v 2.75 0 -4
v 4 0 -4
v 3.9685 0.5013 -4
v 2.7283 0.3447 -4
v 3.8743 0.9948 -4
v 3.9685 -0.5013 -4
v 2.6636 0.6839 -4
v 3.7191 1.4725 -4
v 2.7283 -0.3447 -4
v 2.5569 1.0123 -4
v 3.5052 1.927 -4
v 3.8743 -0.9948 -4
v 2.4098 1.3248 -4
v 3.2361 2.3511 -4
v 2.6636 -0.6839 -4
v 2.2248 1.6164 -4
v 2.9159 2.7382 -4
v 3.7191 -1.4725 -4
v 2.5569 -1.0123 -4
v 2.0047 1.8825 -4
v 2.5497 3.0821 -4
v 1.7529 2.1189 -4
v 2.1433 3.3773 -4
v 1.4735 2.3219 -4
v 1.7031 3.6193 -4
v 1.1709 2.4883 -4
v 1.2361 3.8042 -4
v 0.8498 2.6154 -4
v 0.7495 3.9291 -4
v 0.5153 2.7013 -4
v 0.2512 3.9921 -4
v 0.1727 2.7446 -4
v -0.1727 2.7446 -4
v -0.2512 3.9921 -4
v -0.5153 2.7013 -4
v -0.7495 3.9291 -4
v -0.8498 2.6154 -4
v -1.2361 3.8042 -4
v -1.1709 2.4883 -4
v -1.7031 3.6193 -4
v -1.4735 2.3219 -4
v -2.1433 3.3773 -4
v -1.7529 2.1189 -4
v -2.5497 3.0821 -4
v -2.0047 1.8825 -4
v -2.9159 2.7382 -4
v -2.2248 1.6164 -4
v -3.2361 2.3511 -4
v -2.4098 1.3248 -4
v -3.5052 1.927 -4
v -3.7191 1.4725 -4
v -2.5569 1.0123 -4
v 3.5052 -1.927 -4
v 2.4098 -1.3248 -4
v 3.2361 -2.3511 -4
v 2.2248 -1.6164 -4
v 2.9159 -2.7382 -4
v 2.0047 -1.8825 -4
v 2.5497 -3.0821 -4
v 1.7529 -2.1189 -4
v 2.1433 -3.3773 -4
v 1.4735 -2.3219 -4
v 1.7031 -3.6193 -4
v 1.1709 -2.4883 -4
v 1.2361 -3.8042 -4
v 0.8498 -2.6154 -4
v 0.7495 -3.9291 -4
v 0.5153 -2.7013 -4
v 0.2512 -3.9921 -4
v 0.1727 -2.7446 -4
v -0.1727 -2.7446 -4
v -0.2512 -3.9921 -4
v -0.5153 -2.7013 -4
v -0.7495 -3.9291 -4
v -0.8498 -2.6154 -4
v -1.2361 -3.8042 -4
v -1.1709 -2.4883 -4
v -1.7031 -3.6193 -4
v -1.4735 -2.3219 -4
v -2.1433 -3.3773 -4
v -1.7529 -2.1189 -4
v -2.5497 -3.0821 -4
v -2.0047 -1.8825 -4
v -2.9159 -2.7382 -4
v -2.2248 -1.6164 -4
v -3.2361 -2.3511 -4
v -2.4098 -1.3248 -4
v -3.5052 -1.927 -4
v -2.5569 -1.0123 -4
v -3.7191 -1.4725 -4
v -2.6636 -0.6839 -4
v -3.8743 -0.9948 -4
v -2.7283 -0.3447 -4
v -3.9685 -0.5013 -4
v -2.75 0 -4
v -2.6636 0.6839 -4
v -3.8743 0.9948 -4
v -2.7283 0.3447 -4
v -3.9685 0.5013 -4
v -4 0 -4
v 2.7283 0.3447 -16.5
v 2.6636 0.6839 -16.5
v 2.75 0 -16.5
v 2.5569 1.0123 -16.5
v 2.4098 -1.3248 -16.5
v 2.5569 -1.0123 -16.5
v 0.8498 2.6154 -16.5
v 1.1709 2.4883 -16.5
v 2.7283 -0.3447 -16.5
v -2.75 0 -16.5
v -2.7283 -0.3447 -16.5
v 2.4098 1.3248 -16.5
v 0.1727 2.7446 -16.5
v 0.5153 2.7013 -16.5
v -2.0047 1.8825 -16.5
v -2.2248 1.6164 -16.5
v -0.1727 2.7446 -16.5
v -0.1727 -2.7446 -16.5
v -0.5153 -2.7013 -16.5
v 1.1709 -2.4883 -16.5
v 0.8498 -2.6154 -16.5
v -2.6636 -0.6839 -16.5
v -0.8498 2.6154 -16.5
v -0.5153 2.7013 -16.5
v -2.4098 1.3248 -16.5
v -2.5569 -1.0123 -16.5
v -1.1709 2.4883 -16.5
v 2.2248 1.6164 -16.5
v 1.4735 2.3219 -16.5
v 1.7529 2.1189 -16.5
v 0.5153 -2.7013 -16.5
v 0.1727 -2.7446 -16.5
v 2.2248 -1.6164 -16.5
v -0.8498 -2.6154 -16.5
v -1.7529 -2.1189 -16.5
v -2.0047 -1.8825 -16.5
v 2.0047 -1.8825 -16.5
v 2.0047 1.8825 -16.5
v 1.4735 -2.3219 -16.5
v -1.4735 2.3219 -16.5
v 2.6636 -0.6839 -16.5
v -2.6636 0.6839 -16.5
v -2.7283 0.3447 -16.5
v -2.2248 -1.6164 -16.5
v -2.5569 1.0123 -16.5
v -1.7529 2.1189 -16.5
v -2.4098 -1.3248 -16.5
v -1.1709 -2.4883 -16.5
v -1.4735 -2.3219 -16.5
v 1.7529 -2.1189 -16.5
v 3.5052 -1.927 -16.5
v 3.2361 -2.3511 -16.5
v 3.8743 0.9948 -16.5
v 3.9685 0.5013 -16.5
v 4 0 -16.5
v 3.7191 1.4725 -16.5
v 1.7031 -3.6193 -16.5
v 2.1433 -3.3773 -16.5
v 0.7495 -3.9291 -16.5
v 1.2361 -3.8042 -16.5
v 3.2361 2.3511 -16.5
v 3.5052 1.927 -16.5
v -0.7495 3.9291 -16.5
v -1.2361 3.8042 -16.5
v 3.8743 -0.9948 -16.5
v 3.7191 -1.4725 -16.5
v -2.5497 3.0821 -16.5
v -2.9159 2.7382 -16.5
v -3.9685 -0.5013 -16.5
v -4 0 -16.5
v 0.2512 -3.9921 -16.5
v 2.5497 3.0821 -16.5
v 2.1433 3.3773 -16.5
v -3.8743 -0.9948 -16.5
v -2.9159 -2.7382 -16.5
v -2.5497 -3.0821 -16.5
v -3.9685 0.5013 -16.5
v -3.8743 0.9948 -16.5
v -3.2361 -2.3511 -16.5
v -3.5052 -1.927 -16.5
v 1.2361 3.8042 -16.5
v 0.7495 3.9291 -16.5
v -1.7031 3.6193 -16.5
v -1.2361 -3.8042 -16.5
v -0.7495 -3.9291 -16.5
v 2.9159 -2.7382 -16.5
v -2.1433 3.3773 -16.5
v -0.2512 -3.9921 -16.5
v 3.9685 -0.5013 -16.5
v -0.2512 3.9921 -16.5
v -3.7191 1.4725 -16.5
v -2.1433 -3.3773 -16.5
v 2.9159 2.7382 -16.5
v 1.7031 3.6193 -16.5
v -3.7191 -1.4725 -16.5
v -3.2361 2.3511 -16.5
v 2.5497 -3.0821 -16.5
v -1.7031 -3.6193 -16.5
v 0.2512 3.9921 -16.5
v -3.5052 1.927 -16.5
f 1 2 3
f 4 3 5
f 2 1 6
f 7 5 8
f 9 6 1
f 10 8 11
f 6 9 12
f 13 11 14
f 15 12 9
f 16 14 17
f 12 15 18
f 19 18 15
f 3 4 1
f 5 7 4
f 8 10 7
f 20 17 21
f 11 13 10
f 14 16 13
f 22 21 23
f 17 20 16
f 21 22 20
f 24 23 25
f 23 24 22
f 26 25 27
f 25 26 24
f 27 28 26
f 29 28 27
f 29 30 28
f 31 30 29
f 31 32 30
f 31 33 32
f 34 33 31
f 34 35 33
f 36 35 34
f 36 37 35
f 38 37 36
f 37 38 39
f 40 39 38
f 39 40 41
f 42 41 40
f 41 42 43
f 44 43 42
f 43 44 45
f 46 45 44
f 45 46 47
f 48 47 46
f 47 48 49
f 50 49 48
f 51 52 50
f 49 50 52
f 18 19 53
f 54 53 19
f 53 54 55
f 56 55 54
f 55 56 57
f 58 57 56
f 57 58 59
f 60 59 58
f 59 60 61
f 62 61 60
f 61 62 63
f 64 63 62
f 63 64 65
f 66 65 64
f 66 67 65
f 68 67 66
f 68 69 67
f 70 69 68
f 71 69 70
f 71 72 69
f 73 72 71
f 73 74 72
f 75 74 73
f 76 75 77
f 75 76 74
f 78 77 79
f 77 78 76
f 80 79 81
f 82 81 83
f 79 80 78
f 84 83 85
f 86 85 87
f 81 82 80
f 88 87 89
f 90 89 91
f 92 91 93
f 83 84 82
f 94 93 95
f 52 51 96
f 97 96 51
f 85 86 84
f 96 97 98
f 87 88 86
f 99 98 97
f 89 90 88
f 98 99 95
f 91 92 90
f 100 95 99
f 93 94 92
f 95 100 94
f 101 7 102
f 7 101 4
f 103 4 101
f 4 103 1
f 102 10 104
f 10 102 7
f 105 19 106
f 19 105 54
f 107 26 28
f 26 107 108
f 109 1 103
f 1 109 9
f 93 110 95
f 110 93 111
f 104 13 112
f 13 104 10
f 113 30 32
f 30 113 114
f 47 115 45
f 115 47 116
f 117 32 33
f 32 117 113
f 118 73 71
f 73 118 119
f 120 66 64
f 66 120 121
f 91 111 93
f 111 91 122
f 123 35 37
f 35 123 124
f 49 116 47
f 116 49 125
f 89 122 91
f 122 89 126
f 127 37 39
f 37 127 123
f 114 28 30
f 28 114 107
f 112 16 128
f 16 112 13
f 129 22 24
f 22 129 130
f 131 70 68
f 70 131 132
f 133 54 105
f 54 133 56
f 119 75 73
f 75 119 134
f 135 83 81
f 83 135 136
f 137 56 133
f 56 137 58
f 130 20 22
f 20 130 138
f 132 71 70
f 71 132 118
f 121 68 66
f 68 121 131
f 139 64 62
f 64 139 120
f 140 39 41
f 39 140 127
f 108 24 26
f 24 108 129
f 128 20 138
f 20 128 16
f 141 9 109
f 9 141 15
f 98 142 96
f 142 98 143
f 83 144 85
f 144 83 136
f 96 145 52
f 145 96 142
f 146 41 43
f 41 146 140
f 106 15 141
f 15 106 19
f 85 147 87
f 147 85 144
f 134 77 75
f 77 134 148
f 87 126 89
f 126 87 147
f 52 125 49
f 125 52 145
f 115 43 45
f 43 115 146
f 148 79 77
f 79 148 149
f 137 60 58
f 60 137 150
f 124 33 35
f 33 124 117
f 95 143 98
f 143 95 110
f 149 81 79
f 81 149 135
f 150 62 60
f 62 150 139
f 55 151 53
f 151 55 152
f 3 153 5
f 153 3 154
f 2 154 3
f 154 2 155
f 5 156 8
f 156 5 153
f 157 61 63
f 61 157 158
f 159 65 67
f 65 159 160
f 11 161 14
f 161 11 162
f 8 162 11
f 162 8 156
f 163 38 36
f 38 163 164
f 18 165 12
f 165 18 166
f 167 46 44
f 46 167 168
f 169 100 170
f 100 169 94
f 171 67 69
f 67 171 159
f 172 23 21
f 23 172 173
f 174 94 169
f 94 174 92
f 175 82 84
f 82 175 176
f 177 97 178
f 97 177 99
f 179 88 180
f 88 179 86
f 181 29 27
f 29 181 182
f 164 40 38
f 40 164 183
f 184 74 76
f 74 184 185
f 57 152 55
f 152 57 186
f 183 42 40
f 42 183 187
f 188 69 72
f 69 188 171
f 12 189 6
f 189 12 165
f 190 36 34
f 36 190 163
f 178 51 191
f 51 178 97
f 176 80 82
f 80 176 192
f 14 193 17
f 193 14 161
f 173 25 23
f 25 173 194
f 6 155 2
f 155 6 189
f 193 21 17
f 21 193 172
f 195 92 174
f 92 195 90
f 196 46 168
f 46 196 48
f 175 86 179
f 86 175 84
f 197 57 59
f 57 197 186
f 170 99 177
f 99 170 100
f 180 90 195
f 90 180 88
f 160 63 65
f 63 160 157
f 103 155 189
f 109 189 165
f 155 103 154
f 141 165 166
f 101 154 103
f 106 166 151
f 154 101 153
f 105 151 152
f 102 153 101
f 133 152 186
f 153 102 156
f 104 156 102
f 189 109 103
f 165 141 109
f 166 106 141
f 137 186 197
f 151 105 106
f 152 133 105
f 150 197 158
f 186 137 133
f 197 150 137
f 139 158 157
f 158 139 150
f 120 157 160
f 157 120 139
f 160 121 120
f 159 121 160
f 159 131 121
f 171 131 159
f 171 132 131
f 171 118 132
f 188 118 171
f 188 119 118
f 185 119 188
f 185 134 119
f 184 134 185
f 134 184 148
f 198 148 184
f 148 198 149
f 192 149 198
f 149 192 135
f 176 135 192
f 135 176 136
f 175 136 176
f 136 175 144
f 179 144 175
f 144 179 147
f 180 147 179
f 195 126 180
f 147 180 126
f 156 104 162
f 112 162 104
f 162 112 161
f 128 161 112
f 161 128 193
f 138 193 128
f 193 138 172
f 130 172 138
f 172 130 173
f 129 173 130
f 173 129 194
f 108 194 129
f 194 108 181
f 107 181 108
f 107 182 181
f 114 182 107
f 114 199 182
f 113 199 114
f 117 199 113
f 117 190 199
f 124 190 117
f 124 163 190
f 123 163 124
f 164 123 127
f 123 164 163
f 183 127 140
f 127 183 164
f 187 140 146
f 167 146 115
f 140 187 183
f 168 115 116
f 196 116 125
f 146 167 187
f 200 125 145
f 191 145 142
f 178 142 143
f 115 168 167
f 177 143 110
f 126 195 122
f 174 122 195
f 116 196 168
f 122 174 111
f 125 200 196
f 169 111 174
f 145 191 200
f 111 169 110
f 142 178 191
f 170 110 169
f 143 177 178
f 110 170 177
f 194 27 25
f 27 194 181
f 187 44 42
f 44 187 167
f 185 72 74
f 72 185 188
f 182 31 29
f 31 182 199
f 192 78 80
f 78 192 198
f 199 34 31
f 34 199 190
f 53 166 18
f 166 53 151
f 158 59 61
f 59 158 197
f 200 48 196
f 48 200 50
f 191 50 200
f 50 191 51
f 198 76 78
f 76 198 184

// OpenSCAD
$fn = 50;

difference() {
	union() {
		translate(v = [0, 0, -16.5]) {
			cylinder(h = 16.5, r = 4.0);
		}
	}
	union() {
		translate(v = [0, 0, 0]) {
			rotate(a = [0, 0, 0]) {
				difference() {
					union() {
						translate(v = [0, 0, -4]) {
							linear_extrude(height = 4) {
								polygon(points = [[4.8468, 0.0], [2.4234000000000004, 4.197451927062417], [-2.423399999999999, 4.197451927062417], [-4.8468, 5.935618106107392e-16], [-2.423400000000002, -4.197451927062416], [2.423399999999997, -4.197451927062419]]);
							}
						}
					}
					union();
				}
			}
		}
		#translate(v = [0, 0, -100.0]) {
			cylinder(h = 200, r = 2.75);
		}
	}
}
